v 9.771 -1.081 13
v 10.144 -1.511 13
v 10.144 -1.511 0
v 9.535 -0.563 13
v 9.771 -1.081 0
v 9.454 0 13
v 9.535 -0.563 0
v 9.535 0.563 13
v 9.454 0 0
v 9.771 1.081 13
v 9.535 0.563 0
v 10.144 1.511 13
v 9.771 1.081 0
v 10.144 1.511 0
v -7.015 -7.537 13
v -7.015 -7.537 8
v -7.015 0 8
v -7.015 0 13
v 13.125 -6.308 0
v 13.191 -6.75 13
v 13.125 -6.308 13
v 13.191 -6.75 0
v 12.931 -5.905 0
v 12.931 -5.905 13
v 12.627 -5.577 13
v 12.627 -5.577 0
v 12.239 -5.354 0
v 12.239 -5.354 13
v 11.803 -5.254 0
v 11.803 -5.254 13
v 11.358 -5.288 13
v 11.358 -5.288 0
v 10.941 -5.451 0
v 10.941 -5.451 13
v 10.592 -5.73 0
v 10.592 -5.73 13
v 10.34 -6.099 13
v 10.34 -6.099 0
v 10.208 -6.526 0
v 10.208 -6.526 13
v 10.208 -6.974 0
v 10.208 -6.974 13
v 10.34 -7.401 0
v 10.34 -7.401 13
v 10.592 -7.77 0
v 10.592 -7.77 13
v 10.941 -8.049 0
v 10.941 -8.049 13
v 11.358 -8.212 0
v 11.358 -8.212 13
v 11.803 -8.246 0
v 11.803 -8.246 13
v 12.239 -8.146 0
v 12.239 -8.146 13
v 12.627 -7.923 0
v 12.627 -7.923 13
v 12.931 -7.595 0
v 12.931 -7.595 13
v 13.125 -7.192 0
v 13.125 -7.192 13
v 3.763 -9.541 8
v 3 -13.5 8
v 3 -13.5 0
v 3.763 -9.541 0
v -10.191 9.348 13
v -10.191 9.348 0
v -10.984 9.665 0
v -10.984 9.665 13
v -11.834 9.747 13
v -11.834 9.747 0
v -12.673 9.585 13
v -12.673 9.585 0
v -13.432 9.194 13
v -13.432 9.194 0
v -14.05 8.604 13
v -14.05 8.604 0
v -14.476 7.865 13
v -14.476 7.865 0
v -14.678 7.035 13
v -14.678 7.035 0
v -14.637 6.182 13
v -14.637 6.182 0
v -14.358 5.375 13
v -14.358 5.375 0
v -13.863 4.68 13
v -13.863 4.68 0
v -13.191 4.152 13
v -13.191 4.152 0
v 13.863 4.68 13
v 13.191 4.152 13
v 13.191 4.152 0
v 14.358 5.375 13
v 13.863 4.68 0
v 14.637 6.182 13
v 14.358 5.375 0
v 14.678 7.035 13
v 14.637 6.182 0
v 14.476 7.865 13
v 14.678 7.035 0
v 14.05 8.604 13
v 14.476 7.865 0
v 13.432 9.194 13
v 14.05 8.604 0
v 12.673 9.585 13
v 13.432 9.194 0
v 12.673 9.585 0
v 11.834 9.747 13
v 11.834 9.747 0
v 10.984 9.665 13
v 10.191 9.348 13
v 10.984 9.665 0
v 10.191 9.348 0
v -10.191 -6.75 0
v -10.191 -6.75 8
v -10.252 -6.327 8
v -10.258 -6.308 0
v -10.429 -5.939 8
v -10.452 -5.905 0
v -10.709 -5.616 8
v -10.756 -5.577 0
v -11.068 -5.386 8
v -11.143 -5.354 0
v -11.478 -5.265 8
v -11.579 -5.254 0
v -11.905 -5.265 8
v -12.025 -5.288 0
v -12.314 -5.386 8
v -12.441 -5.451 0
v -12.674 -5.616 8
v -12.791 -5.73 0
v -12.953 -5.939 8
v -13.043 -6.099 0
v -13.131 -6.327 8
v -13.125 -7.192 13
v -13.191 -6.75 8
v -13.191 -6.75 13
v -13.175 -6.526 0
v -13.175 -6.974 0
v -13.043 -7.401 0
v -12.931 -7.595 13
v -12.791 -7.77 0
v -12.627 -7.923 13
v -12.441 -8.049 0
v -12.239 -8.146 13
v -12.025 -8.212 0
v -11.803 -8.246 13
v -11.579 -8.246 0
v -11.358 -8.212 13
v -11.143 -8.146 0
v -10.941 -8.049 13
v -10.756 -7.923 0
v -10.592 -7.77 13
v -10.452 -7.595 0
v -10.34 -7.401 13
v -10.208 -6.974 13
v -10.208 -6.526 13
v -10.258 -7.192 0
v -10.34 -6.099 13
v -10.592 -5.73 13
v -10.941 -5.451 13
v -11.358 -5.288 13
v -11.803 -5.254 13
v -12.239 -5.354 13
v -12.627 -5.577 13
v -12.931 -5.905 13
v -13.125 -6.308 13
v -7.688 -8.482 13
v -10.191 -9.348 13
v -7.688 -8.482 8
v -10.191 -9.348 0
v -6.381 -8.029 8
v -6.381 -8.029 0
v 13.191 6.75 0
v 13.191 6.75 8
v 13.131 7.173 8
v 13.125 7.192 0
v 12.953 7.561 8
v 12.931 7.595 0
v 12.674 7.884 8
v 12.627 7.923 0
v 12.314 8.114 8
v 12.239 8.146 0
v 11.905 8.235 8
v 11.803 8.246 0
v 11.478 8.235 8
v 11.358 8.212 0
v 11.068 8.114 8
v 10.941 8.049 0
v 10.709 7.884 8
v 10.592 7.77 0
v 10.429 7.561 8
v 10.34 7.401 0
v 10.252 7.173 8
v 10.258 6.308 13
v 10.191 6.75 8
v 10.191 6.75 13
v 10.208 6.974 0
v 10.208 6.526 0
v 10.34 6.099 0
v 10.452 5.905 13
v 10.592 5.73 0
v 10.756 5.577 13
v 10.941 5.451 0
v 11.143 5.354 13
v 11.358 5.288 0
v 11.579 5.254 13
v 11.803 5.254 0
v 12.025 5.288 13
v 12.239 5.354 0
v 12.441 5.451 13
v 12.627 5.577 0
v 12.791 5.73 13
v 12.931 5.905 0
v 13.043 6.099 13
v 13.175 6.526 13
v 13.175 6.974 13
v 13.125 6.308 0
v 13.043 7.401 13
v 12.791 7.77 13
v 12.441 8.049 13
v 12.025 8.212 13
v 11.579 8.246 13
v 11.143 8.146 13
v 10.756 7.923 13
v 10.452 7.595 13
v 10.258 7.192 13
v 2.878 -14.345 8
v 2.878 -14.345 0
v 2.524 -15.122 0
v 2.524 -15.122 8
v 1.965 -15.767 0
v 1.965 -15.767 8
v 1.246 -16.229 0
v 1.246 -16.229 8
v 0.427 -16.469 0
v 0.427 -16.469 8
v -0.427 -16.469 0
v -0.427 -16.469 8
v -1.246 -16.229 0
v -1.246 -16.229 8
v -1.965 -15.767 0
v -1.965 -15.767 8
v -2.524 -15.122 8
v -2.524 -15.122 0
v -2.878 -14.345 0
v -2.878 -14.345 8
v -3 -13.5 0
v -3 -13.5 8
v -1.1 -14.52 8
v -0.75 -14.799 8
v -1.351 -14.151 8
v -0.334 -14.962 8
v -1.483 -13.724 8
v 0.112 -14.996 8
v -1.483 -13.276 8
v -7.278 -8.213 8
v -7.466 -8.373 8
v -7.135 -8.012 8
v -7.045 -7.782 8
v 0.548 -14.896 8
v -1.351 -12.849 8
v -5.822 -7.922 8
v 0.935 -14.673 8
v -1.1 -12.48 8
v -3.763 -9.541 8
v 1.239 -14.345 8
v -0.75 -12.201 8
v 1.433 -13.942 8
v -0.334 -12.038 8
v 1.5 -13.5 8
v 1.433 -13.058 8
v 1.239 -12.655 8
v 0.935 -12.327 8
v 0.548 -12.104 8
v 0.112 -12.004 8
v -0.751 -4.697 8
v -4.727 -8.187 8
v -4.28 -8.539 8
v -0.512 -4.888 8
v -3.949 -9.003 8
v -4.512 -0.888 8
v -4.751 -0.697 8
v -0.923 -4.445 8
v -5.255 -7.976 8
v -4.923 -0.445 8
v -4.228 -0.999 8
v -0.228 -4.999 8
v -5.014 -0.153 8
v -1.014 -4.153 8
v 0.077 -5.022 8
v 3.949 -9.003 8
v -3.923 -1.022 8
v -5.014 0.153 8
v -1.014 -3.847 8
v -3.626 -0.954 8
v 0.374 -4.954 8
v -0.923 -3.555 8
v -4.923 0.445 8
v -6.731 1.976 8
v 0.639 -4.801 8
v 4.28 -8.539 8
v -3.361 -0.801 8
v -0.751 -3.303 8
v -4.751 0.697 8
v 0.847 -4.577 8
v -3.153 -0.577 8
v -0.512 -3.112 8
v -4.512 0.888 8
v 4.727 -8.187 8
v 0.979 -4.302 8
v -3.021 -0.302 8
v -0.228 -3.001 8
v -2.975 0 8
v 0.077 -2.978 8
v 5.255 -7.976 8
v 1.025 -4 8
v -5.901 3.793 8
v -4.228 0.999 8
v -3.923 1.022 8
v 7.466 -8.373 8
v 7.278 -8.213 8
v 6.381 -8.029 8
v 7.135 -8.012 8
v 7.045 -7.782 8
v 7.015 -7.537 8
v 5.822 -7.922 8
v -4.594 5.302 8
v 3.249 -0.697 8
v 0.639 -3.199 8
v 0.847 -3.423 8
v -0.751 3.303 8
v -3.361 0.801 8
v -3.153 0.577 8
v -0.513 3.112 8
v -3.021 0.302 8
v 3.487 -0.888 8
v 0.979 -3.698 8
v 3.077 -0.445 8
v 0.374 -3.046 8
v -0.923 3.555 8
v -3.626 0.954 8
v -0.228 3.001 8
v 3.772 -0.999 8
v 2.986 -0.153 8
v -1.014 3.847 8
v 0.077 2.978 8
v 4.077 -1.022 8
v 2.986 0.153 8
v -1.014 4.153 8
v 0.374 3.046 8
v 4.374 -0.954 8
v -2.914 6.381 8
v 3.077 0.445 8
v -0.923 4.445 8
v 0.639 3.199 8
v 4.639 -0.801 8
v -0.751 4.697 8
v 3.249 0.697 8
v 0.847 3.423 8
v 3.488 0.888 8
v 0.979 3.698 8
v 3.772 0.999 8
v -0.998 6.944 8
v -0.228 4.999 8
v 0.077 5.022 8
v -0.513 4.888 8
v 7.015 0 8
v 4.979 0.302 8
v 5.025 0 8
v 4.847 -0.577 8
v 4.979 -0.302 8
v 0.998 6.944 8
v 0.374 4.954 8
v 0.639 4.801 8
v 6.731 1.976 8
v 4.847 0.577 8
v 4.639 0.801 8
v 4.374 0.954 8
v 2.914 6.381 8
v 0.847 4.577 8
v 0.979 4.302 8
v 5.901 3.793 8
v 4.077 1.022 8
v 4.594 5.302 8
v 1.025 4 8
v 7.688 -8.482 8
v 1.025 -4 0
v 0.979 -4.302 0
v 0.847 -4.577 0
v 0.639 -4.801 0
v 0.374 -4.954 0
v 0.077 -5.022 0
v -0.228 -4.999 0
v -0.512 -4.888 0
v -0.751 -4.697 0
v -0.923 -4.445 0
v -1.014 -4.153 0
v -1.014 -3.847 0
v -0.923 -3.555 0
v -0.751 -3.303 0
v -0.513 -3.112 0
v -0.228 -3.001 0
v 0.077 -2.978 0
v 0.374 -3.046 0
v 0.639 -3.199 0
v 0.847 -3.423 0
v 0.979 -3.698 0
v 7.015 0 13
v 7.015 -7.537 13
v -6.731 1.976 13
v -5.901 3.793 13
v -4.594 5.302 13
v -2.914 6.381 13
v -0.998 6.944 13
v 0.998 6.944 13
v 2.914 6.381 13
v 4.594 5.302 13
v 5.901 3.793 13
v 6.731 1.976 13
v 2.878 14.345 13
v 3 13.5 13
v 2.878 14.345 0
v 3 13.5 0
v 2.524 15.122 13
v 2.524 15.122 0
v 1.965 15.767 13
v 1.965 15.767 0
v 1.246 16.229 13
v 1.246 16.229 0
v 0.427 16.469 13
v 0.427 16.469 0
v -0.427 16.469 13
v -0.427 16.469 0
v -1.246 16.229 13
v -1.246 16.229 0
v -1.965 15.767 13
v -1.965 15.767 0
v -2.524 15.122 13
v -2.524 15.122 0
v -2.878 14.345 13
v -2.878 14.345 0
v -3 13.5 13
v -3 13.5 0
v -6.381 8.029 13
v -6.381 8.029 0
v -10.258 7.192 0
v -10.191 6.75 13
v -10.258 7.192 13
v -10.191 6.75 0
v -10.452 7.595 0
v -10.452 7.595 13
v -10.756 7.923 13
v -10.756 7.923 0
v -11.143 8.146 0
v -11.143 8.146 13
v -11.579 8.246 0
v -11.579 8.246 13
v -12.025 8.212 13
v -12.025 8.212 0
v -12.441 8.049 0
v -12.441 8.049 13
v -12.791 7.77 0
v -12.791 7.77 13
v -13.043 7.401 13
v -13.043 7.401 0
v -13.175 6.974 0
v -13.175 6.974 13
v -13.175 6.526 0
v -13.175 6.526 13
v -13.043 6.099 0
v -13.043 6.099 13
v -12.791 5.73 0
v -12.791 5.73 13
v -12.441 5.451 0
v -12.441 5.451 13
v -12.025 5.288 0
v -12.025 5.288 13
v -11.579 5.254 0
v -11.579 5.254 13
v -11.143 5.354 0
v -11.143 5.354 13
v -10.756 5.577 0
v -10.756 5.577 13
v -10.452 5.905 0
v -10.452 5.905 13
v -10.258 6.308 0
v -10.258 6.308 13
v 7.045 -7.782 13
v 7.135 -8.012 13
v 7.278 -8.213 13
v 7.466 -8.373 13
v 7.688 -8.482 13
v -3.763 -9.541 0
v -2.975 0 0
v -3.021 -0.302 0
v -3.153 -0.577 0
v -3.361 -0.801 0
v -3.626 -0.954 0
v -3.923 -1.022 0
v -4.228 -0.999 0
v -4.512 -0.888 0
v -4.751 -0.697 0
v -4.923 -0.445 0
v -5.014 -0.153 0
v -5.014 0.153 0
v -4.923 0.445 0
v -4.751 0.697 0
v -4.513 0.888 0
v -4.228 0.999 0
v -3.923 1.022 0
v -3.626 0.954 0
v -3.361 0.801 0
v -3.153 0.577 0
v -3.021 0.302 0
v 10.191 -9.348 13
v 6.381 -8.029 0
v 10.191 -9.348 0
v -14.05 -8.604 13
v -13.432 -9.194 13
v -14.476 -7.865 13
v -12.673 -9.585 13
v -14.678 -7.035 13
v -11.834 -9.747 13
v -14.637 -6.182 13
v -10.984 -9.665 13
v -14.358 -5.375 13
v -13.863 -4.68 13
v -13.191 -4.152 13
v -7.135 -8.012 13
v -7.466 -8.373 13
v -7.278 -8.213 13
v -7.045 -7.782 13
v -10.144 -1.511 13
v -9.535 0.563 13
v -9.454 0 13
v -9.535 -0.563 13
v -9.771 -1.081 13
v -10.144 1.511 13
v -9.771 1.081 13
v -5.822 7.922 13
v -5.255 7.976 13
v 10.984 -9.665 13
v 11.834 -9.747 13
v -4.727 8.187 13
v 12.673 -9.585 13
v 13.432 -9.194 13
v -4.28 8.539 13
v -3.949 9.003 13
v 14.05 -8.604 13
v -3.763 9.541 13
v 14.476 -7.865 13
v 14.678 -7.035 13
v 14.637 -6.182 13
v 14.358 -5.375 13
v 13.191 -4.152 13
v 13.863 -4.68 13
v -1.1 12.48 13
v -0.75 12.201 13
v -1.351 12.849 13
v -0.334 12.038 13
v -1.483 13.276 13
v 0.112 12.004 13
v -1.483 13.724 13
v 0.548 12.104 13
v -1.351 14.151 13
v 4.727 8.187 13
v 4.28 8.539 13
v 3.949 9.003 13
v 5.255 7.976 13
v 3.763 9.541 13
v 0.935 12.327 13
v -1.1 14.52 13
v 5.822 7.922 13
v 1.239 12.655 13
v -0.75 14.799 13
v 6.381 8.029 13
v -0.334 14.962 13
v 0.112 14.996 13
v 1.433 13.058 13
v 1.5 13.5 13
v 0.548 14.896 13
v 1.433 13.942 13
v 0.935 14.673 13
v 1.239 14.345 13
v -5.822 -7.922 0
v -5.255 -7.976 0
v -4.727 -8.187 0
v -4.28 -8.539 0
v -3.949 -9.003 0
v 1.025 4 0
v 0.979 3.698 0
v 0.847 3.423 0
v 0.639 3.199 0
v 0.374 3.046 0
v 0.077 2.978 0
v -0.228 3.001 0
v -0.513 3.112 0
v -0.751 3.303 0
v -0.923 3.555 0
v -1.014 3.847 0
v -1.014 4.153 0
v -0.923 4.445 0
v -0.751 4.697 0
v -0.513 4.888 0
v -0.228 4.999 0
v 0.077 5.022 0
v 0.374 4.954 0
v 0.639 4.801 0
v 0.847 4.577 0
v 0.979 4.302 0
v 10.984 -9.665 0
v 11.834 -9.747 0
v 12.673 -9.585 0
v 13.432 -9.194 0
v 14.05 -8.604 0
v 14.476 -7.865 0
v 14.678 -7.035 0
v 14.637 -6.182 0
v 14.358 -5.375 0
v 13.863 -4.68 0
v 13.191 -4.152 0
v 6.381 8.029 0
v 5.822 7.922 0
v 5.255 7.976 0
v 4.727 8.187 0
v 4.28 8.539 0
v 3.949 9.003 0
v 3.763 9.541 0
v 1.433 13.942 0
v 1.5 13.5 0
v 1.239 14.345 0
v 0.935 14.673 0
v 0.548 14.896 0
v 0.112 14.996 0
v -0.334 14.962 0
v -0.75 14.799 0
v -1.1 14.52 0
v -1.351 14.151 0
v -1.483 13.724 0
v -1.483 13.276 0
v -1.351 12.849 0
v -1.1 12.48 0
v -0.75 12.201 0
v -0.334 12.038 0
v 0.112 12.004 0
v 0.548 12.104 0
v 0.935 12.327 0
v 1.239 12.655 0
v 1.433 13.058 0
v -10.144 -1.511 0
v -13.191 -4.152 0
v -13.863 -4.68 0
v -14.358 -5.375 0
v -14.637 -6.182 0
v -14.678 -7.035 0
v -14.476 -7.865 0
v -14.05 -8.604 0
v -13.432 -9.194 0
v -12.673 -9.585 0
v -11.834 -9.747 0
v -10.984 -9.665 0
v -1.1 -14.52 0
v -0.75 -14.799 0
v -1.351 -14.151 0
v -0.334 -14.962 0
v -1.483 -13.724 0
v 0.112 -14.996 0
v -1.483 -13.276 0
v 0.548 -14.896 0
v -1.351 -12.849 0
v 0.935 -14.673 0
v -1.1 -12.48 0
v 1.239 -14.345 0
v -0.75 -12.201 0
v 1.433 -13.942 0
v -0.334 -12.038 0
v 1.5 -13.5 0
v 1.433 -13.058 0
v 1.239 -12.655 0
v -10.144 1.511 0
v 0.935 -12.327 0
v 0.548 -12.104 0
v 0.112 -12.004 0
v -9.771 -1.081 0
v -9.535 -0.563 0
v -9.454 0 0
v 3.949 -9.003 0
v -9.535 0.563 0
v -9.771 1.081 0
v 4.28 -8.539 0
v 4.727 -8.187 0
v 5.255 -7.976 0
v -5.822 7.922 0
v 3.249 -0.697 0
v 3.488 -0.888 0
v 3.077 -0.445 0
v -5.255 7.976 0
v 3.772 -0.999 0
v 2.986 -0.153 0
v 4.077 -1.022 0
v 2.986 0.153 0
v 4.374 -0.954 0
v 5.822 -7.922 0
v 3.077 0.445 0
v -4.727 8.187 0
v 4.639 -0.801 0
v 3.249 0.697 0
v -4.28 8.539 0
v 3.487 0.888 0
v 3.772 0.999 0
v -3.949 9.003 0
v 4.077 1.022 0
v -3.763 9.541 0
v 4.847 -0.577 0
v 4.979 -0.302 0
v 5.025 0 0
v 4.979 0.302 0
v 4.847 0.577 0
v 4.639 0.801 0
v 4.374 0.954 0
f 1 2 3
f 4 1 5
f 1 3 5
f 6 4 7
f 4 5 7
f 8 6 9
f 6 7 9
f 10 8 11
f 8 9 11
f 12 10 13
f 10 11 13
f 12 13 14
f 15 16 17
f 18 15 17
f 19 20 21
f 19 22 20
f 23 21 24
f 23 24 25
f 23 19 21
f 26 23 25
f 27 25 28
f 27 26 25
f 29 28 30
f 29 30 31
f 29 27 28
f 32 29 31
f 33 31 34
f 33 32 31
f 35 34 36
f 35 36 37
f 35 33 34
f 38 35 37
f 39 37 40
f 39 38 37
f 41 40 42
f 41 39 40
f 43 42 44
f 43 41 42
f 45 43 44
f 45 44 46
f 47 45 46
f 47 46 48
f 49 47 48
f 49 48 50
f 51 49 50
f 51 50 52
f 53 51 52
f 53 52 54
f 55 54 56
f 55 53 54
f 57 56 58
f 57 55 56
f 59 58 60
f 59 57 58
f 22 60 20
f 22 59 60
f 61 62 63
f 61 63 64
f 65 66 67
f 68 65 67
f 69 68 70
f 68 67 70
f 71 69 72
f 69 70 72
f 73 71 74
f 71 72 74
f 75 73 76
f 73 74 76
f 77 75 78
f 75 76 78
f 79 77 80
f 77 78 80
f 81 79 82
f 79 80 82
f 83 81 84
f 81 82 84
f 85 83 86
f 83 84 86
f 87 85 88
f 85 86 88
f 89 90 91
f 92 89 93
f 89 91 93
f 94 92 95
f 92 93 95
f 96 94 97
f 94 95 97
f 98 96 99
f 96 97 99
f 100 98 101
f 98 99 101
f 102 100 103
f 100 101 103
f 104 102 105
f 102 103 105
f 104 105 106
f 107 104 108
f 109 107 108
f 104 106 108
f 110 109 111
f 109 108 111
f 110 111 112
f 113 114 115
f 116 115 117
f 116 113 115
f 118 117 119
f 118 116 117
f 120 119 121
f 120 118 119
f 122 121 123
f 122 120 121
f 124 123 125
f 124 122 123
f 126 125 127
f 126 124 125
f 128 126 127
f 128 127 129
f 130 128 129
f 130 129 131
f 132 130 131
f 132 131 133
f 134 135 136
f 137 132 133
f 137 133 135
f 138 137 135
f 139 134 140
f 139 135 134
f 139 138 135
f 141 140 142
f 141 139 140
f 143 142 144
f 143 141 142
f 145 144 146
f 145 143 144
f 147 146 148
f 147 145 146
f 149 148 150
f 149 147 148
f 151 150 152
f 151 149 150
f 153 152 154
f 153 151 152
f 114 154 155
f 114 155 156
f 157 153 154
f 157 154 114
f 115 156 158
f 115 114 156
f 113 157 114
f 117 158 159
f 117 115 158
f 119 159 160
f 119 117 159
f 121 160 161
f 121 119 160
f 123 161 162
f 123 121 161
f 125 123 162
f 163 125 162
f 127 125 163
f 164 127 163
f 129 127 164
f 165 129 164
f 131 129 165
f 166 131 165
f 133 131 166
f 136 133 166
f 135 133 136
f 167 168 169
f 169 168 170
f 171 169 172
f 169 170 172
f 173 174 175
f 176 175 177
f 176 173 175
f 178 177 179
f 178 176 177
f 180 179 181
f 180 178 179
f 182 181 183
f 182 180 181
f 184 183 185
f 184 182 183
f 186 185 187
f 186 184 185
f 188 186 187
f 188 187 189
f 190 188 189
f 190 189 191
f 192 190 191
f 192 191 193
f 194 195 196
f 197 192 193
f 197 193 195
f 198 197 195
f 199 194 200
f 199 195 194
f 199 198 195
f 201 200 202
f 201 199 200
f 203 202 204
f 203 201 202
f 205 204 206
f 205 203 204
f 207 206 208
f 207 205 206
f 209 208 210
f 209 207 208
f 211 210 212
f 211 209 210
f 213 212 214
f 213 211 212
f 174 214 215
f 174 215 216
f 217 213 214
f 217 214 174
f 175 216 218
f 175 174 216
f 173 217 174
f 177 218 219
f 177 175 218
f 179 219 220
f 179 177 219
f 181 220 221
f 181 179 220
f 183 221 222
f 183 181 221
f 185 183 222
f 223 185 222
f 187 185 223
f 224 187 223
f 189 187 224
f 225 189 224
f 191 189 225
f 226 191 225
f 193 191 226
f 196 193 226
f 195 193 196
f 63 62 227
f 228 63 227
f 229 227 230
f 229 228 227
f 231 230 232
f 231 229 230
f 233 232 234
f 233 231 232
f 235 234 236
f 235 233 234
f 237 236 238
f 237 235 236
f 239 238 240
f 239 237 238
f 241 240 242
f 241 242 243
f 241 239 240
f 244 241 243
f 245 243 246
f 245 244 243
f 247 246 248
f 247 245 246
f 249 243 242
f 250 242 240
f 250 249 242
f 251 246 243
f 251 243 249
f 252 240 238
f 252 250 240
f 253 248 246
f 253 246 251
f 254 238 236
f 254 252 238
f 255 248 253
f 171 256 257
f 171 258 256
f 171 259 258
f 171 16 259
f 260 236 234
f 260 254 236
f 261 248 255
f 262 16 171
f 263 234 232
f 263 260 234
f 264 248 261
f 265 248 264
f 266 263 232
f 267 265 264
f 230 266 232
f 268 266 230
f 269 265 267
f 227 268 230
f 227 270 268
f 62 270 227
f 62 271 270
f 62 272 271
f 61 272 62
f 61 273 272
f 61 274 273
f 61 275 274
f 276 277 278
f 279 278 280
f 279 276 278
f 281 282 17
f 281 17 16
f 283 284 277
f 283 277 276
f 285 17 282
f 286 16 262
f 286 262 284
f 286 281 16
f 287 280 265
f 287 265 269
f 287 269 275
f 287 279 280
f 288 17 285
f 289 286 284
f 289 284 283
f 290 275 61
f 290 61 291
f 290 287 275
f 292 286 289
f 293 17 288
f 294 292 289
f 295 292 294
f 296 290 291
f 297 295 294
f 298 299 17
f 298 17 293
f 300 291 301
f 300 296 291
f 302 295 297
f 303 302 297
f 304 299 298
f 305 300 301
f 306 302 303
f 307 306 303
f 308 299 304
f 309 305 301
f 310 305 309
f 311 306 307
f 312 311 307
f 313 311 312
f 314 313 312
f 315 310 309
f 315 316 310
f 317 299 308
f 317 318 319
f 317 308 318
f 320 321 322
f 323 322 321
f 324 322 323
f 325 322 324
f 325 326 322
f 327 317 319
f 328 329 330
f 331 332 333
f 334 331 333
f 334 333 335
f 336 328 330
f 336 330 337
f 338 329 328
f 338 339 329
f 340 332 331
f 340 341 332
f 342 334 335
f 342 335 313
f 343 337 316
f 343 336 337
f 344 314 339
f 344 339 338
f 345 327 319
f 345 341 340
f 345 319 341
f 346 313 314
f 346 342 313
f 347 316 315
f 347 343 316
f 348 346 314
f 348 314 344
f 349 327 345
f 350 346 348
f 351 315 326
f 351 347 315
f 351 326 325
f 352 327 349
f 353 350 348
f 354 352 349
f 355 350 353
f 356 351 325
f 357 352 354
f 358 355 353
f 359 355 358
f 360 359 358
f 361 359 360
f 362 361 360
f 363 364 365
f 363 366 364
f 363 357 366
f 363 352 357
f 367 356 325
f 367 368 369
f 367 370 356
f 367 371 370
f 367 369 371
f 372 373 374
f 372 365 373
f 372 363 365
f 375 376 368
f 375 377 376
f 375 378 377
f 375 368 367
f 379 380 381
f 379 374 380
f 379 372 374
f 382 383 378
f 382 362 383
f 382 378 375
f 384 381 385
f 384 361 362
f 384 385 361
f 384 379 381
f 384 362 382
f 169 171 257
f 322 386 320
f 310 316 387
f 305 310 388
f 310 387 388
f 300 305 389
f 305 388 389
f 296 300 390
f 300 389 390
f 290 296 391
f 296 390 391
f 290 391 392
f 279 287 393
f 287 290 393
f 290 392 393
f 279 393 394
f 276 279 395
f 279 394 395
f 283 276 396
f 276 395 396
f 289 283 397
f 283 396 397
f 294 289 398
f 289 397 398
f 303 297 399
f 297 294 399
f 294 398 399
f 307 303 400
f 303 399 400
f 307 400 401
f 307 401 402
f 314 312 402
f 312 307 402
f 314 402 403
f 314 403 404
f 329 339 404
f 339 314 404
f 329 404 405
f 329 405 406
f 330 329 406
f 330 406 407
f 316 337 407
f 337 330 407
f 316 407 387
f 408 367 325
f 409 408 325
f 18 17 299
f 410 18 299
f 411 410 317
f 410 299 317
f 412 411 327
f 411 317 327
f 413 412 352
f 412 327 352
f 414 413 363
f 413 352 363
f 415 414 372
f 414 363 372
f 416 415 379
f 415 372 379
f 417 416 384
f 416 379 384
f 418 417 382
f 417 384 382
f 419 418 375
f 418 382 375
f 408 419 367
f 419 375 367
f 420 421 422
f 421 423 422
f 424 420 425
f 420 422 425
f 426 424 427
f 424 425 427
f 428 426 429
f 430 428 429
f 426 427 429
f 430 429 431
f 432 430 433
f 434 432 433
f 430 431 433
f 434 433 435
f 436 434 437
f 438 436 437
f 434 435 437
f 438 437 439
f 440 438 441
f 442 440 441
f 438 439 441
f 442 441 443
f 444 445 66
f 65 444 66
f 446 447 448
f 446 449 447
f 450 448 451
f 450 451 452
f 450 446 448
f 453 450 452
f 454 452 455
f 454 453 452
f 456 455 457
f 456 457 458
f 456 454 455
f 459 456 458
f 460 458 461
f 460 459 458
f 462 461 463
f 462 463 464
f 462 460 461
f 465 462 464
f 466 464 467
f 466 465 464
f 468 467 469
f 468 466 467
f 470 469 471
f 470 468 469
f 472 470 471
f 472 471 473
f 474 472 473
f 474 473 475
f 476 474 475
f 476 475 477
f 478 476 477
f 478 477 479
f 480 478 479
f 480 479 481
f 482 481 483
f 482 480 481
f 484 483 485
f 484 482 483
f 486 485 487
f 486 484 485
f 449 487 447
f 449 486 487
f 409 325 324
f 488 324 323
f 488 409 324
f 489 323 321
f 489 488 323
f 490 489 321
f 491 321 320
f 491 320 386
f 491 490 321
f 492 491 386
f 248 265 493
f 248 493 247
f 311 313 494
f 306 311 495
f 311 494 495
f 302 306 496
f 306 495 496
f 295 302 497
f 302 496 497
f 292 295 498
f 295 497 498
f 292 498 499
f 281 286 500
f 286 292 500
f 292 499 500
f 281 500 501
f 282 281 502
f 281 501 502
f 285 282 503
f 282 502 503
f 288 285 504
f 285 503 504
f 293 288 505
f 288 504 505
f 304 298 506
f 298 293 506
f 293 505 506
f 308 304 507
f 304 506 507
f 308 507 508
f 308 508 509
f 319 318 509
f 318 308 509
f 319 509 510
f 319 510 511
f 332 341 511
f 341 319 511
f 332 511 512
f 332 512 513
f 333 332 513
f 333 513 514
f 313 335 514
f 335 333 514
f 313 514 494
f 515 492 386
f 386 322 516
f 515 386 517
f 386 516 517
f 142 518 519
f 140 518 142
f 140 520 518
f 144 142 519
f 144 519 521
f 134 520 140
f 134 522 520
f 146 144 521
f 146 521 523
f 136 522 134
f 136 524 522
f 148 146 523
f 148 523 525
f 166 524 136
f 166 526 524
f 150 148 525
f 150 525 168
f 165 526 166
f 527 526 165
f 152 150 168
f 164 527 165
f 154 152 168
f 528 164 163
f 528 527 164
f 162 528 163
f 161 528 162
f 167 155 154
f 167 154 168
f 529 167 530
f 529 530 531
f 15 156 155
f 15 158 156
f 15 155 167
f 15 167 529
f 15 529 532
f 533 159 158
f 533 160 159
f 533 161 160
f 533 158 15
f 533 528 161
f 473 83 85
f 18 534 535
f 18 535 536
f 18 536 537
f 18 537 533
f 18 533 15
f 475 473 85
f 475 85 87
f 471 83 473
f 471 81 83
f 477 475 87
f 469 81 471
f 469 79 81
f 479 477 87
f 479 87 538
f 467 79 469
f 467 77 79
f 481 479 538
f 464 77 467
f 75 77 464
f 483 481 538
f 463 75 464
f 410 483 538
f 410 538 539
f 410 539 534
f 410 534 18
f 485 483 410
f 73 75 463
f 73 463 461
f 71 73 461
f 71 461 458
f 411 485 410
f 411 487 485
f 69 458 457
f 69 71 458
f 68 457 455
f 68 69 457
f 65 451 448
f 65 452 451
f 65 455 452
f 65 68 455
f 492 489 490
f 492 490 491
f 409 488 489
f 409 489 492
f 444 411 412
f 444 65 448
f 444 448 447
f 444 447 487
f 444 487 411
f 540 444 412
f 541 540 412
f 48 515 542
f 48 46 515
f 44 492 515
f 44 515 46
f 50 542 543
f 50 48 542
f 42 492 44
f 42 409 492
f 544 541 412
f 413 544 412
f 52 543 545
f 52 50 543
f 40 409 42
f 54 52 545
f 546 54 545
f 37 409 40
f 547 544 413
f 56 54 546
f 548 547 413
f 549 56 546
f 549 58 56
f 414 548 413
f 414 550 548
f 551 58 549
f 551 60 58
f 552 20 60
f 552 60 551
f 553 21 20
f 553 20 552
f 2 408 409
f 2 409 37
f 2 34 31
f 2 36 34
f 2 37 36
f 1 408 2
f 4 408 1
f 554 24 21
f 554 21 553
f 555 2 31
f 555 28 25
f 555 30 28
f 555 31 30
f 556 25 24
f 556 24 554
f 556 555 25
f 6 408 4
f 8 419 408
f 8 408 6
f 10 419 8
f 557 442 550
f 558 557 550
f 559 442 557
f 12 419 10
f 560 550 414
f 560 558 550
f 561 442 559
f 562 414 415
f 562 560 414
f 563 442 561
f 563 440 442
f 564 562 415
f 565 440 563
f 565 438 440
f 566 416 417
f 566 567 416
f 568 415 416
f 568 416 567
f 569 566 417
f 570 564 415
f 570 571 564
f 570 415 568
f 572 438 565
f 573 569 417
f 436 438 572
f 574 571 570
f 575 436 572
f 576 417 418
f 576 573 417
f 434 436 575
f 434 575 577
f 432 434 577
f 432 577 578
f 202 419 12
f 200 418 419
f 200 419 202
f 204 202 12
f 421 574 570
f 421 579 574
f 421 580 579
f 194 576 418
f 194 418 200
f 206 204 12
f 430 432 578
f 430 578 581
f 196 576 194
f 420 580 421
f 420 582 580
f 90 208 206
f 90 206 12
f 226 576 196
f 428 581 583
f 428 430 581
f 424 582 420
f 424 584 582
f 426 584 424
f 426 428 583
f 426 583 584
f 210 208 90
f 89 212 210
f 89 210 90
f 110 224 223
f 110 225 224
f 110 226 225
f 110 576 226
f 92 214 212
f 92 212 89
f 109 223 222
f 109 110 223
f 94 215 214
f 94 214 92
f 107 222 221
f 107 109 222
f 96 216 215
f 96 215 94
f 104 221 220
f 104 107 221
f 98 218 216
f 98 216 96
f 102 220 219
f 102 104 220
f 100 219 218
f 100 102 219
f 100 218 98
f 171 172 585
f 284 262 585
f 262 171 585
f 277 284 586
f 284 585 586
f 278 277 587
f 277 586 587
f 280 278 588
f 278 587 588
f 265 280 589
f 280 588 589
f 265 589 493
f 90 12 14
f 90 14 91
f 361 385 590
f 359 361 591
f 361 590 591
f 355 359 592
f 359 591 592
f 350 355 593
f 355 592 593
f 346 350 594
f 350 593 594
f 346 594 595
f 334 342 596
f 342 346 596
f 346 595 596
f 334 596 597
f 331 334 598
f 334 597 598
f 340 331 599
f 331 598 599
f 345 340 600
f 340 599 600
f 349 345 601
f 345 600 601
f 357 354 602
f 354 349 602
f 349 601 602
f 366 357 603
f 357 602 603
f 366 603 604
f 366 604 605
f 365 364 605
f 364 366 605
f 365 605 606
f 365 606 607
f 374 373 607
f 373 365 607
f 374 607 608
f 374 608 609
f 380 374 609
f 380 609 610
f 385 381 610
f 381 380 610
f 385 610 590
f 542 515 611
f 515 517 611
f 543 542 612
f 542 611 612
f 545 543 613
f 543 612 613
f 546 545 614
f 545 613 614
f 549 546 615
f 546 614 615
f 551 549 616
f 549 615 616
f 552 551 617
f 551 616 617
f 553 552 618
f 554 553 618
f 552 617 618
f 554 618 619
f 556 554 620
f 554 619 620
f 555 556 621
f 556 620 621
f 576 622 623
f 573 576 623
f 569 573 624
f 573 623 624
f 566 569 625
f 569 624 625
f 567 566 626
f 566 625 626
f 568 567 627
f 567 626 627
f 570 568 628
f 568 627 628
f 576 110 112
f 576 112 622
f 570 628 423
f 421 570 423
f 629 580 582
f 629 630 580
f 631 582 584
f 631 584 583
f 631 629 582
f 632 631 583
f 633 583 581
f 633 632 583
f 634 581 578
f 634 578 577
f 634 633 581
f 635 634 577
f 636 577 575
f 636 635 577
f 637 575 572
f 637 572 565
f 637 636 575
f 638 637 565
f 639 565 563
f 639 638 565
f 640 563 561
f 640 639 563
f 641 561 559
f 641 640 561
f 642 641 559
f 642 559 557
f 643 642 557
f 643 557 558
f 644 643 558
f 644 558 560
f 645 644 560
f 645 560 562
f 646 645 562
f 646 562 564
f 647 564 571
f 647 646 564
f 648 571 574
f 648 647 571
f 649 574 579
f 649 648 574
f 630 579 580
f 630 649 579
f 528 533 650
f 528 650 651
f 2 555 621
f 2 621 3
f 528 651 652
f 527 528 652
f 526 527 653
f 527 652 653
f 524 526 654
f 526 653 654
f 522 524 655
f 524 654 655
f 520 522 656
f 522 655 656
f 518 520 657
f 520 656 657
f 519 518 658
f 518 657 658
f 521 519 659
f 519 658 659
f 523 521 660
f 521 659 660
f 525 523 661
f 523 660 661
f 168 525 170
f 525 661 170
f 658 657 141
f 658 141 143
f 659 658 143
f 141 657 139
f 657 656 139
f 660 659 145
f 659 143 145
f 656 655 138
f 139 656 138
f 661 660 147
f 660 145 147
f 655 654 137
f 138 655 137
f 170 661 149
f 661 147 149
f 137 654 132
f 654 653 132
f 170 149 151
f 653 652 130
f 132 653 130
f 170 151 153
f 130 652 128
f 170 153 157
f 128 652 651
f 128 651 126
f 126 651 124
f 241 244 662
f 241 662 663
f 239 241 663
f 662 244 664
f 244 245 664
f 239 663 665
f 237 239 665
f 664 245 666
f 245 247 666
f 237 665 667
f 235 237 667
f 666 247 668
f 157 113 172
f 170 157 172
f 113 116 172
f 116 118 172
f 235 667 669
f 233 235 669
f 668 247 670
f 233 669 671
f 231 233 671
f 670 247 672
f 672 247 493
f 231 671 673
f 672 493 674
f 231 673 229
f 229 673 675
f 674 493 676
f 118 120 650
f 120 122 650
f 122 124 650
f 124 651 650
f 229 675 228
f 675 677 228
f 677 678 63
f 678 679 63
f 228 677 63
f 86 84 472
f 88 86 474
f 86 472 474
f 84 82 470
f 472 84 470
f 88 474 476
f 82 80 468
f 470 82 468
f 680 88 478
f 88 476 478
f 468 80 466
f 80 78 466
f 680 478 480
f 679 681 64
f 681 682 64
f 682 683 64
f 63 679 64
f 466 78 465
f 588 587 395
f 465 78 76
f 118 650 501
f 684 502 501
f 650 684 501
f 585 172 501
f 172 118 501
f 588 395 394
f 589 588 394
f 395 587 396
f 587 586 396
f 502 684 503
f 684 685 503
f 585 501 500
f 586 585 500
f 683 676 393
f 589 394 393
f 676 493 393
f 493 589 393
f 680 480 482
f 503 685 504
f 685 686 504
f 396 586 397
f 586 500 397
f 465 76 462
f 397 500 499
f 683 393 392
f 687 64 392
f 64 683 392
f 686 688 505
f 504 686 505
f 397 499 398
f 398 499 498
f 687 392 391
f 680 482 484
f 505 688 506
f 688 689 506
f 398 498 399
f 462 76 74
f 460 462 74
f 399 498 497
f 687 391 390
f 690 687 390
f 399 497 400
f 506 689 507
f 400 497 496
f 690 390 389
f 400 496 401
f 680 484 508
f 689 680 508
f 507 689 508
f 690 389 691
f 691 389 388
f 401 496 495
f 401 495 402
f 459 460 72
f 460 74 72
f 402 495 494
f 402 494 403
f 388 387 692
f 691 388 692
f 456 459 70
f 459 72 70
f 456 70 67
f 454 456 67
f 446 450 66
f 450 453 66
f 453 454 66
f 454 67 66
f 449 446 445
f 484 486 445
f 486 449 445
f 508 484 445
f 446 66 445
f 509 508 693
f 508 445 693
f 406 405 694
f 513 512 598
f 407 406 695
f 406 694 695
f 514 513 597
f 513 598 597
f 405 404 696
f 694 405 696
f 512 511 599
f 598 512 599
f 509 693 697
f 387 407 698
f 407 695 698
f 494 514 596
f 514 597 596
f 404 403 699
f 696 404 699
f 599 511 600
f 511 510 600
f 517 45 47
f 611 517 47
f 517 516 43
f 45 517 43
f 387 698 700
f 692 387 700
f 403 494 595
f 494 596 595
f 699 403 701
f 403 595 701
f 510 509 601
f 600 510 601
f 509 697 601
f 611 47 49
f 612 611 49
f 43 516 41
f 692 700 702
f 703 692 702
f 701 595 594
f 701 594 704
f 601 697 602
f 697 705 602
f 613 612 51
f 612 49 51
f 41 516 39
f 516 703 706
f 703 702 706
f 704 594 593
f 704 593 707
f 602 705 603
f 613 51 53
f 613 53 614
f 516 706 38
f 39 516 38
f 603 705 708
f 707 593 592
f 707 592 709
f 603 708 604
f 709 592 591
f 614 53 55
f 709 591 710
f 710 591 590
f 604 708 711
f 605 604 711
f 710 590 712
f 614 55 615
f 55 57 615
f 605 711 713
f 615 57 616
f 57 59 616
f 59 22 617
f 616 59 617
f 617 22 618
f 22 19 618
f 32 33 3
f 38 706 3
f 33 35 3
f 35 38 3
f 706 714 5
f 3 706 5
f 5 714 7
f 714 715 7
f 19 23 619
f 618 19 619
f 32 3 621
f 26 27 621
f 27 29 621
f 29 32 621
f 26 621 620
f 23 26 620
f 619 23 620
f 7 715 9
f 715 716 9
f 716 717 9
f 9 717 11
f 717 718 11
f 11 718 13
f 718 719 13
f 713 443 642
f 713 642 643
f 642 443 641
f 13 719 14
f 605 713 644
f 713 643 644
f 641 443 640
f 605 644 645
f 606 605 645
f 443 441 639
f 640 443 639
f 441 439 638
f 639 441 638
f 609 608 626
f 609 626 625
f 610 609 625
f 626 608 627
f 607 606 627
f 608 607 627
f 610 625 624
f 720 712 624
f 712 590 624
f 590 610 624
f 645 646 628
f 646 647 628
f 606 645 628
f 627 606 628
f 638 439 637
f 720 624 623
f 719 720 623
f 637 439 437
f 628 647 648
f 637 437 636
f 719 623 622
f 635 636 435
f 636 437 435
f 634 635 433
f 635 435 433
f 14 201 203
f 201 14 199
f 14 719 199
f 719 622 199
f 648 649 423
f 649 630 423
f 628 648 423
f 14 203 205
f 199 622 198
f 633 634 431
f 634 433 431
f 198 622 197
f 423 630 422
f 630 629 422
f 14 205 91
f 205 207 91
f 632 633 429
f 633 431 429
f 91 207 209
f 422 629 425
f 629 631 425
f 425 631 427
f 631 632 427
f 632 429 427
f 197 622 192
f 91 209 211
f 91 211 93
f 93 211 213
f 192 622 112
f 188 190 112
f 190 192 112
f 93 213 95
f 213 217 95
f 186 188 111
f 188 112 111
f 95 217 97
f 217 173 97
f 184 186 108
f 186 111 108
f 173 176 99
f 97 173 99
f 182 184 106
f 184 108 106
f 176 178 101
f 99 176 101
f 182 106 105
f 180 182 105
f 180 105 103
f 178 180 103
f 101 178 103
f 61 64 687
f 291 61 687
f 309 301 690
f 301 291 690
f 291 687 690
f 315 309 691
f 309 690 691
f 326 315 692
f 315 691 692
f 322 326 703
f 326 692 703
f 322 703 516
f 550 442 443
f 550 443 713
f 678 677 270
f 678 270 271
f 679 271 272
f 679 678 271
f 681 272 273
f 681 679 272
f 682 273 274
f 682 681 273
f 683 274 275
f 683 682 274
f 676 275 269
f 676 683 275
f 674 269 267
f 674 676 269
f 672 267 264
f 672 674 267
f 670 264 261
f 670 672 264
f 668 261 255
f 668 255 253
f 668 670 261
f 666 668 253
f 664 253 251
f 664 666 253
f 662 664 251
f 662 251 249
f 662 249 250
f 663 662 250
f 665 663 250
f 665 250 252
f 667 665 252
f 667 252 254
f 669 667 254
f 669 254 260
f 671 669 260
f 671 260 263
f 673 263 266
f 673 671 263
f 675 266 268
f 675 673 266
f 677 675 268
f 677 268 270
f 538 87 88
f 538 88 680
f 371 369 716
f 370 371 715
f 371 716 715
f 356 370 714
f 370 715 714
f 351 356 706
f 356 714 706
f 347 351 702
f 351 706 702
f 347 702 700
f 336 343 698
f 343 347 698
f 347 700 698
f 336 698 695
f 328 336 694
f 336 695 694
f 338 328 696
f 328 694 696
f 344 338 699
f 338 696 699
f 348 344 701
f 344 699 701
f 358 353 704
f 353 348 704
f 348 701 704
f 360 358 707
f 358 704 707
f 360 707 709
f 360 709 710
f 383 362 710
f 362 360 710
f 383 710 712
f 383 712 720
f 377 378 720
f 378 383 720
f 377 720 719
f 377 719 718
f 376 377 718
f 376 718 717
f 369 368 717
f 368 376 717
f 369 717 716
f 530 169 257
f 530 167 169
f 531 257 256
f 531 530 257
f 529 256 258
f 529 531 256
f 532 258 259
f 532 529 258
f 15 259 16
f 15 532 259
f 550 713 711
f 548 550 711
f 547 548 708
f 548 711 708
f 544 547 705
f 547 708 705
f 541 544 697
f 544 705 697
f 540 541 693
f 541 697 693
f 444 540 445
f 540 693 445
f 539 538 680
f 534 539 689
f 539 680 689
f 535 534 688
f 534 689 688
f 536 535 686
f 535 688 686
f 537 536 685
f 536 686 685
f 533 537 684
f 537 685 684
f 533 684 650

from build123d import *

# Parameters (mm, degrees)
SKETCH_2_R          = 18
SKETCH_2_R_2        = 1.4999999999999998
SKETCH_2_R_3        = 1.5000000000000022
SKETCH_2_R_4        = 1.5000000000000007
SKETCH_2_R_5        = 10.499999999999998
SKETCH_2_R_6        = 1.4999999999999987
EXTRUDE_1_DEPTH     = 8
EXTRUDE_START       = -4
SKETCH_6_R          = 10.499999999999998
EXTRUDE_2_DEPTH     = 4
SKETCH_7_R          = 2.9999999999999996
SKETCH_7_R_2        = 1.5000000000000004
SKETCH_7_R_3        = 1.5000000000000013
EXTRUDE_3_DEPTH     = 4
SKETCH_9_R          = 1.025
SKETCH_9_R_2        = 1.0250000000000001
CUT_EXTRUDE_2_DEPTH = 4
CUT_EXTRUDE_3_DEPTH = 13.000000000000002
CUT_EXTRUDE_4_DEPTH = 23
CUT_EXTRUDE_START   = -8
SKETCH_13_R         = 18
CUT_EXTRUDE_5_DEPTH = 8
FILLET_6_R          = 2
FILLET_7_R          = 2
SKETCH_22_R         = 26.500000000000004
CUT_EXTRUDE_7_DEPTH = 4
SKETCH_23_R         = 1.5000000000000024
SKETCH_23_R_2       = 1.4999999999999998
EXTRUDE_4_DEPTH     = 5
FILLET_8_R          = 1
EXTRUDE_START_2     = 4
SKETCH_24_R         = 1.0250000000000001
SKETCH_24_R_2       = 1.025
EXTRUDE_5_DEPTH     = 4


with BuildPart() as part:
    # 草图2 → 凸台-拉伸1 (new body)
    with BuildSketch(Plane.XY):
        Circle(SKETCH_2_R)
        with Locations((0, 13.5)):
            Circle(SKETCH_2_R_2, mode=Mode.SUBTRACT)
        with Locations((11.691342951089924, -6.749999999999998)):
            Circle(SKETCH_2_R_3, mode=Mode.SUBTRACT)
        with Locations((-11.691342951089919, -6.750000000000006)):
            Circle(SKETCH_2_R_4, mode=Mode.SUBTRACT)
        Circle(SKETCH_2_R_5, mode=Mode.SUBTRACT)
        with Locations((0, -13.5)):
            Circle(SKETCH_2_R_2, mode=Mode.SUBTRACT)
        with Locations((-11.691342951089924, 6.749999999999997)):
            Circle(SKETCH_2_R_6, mode=Mode.SUBTRACT)
        with Locations((11.691342951089919, 6.750000000000008)):
            Circle(SKETCH_2_R_4, mode=Mode.SUBTRACT)
    extrude(amount=EXTRUDE_1_DEPTH)

    # 草图6 → 凸台-拉伸2 (add)
    with BuildSketch(Plane.XY.offset(8).offset(EXTRUDE_START)):
        Circle(SKETCH_6_R)
    extrude(amount=EXTRUDE_2_DEPTH)

    # 草图9 → 切除-拉伸2 (cut)
    with BuildSketch(Plane.XY.offset(8)):
        with Locations((0, 4)):
            Circle(SKETCH_9_R)
        with Locations((-4, 2.4e-16)):
            Circle(SKETCH_9_R_2)
        with Locations((4.9e-16, -4)):
            Circle(SKETCH_9_R)
        with Locations((4, 2.4e-16)):
            Circle(SKETCH_9_R_2)
    extrude(amount=-CUT_EXTRUDE_2_DEPTH, mode=Mode.SUBTRACT)

    # 草图13 → 切除-拉伸5 (cut)
    with BuildSketch(Plane.XY.offset(8).offset(CUT_EXTRUDE_START)):
        Circle(SKETCH_13_R)
        with BuildLine():
            Line((-4.2, 7.274613391789286), (-3.0000000000000004, 13.5))
            ThreePointArc((-3.0000000000000004, 13.5), (1.8e-16, 16.5), (3.0000000000000004, 13.5))
            Line((3.0000000000000004, 13.5), (4.2, 7.274613391789286))
            Line((4.2, 7.274613391789286), (10.191342951089922, 9.348076211353316))
            ThreePointArc((10.19134295108992, 9.34807621135332), (13.19134295108992, 9.34807621135332), (14.691342951089922, 6.750000000000004))
            ThreePointArc((14.691342951089922, 6.7500000000000036), (14.289419162443235, 5.250000000000002), (13.191342951089917, 4.151923788646687))
            Line((13.19134295108992, 4.151923788646681), (8.4, 8.9e-16))
            Line((8.4, 8.9e-16), (13.19134295108992, -4.151923788646685))
            ThreePointArc((13.191342951089924, -4.151923788646679), (14.289419162443242, -5.249999999999996), (14.691342951089926, -6.749999999999997))
            ThreePointArc((14.691342951089926, -6.749999999999998), (13.191342951089924, -9.348076211353316), (10.191342951089919, -9.348076211353312))
            Line((10.191342951089919, -9.348076211353318), (4.200000000000001, -7.274613391789285))
            Line((4.200000000000001, -7.274613391789285), (2.999999999999996, -13.5))
            ThreePointArc((3.000000000000002, -13.5), (1.18e-15, -16.5), (-2.9999999999999987, -13.5))
            Line((-3.000000000000005, -13.499999999999996), (-4.199999999999998, -7.274613391789289))
            Line((-4.199999999999998, -7.274613391789289), (-10.191342951089924, -9.34807621135331))
            ThreePointArc((-10.191342951089917, -9.348076211353325), (-14.289419162443238, -8.250000000000007), (-13.191342951089919, -4.1519237886466875))
            Line((-13.191342951089924, -4.151923788646676), (-8.4, -6.22e-15))
            Line((-8.4, -6.22e-15), (-13.191342951089919, 4.151923788646697))
            ThreePointArc((-13.191342951089933, 4.151923788646676), (-14.289419162443243, 8.249999999999995), (-10.191342951089926, 9.348076211353307))
            Line((-10.191342951089913, 9.348076211353327), (-4.2, 7.274613391789286))
        make_face(mode=Mode.SUBTRACT)
    extrude(amount=CUT_EXTRUDE_5_DEPTH, mode=Mode.SUBTRACT)

    # 圆角6
    fillet_6_edges = [part.edges().sort_by_distance(p)[0] for p in [
        (-3.7087365602143945, 9.823200757743328, 2),
        (-4.2, 7.274613391789286, 6),
        (-10.361509682787466, -1.6997403017818833, 2),
        (-3.708736560214394, -9.823200757743328, 2),
        (6.652773122573071, -8.123460455961444, 2),
        (10.361509682787464, 1.6997403017818842, 2),
        (3.7087365602143936, 9.823200757743328, 2),
        (-6.652773122573068, 8.123460455961448, 2),
        (-10.361509682787464, 1.6997403017818868, 2),
        (-8.4, -6.22e-15, 6),
        (-6.652773122573072, -8.123460455961444, 2),
        (-4.199999999999998, -7.274613391789289, 6),
        (3.7087365602143914, -9.823200757743328, 2),
        (4.200000000000001, -7.274613391789285, 6),
        (10.361509682787466, -1.6997403017818833, 2),
        (8.4, 8.9e-16, 6),
        (6.652773122573071, 8.123460455961444, 2),
        (4.2, 7.274613391789286, 6),
    ]]
    fillet(fillet_6_edges, radius=FILLET_6_R)

    # 草图23 → 凸台-拉伸4 (add)
    with BuildSketch(Plane.XY.offset(8)):
        with BuildLine():
            Line((7.015, 0), (7.015, -8.248818655070188))
            Line((7.015, -8.248818655070188), (10.191342951089933, -9.348076211353321))
            ThreePointArc((10.191342951089933, -9.348076211353321), (14.289419162443245, -8.249999999999993), (13.19134295108992, -4.151923788646683))
            Line((13.19134295108992, -4.151923788646683), (10.144242051851217, -1.5114676912433453))
            ThreePointArc((10.144242051851217, -1.5114676912433453), (9.45399982271097, 1.11e-15), (10.144242051851217, 1.5114676912433471))
            Line((10.144242051851217, 1.5114676912433471), (13.19134295108992, 4.151923788646685))
            ThreePointArc((13.19134295108992, 4.151923788646685), (14.289419162443243, 8.249999999999995), (10.191342951089933, 9.348076211353321))
            Line((10.191342951089933, 9.348076211353321), (7.015, 8.248818655070192))
            Line((7.015, 8.248818655070192), (6.381090443541757, 8.029437473419858))
            ThreePointArc((6.381090443541757, 8.029437473419858), (4.726999911355481, 8.187404013841277), (3.7631516083094527, 9.540905164663204))
            Line((3.7631516083094527, 9.540905164663204), (2.9999999999999996, 13.5))
            ThreePointArc((2.9999999999999996, 13.5), (1.8e-16, 16.5), (-2.9999999999999996, 13.5))
            Line((-2.9999999999999996, 13.5), (-3.7631516083094527, 9.540905164663204))
            ThreePointArc((-3.7631516083094527, 9.540905164663204), (-4.726999911355481, 8.187404013841277), (-6.381090443541757, 8.029437473419858))
            Line((-6.381090443541757, 8.029437473419858), (-7.015, 8.248818655070192))
            Line((-7.015, 8.248818655070192), (-10.191342951089933, 9.348076211353321))
            ThreePointArc((-10.191342951089933, 9.348076211353321), (-14.289419162443243, 8.249999999999995), (-13.19134295108992, 4.151923788646685))
            Line((-13.19134295108992, 4.151923788646685), (-10.144242051851217, 1.5114676912433471))
            ThreePointArc((-10.144242051851217, 1.5114676912433471), (-9.45399982271097, 8.7e-16), (-10.144242051851217, -1.5114676912433453))
            Line((-10.144242051851217, -1.5114676912433453), (-13.19134295108992, -4.151923788646683))
            ThreePointArc((-13.19134295108992, -4.151923788646683), (-14.289419162443245, -8.249999999999993), (-10.191342951089933, -9.348076211353321))
            Line((-10.191342951089933, -9.348076211353321), (-7.015, -8.248818655070188))
            Line((-7.015, -8.248818655070188), (-7.015, 0))
            ThreePointArc((-7.015, 0), (4.3e-16, 7.015), (7.015, 0))
        make_face()
        with Locations((11.691342951089924, -6.749999999999998)):
            Circle(SKETCH_23_R, mode=Mode.SUBTRACT)
        with Locations(Location((11.691342951089924, 6.75, 0), (0, 0, 180))):
            Circle(SKETCH_23_R, mode=Mode.SUBTRACT)
        with Locations((0, 13.5)):
            Circle(SKETCH_23_R_2, mode=Mode.SUBTRACT)
        with Locations(Location((-11.691342951089924, -6.749999999999998, 0), (0, 0, 180))):
            Circle(SKETCH_23_R, mode=Mode.SUBTRACT)
        with Locations((-11.691342951089924, 6.75)):
            Circle(SKETCH_23_R, mode=Mode.SUBTRACT)
    extrude(amount=EXTRUDE_4_DEPTH)

    # 圆角8
    fillet_8_edges = [part.edges().sort_by_distance(p)[0] for p in [
        (7.015, -8.248818655070188, 10.5),
        (-7.015, -8.248818655070188, 10.5),
    ]]
    fillet(fillet_8_edges, radius=FILLET_8_R)

    # 草图24 → 凸台-拉伸5 (add)
    with BuildSketch(Plane(origin=(0, 0, 4), x_dir=(-1, 0, 0), z_dir=(0, 0, -1)).offset(EXTRUDE_START_2)):
        with BuildLine():
            Line((-3.7631516083094545, 9.540905164663204), (-3.130304023425084, 12.824005897977921))
            ThreePointArc((-3.130304023425084, 12.824005897977921), (-2.647549400093676, 11.101446750226756), (-0.9798228051184064, 10.454183242634018))
            ThreePointArc((-0.9798228051184064, 10.454183242634018), (6.4e-16, 10.499999999999998), (0.9798228051184061, 10.454183242634016))
            ThreePointArc((0.9798228051184061, 10.454183242634016), (2.647549400093674, 11.101446750226758), (3.130304023425079, 12.824005897977921))
            Line((3.130304023425079, 12.824005897977921), (3.763151608309469, 9.540905164663112))
            ThreePointArc((3.763151608309469, 9.540905164663112), (4.726999911355525, 8.187404013841222), (6.38109044354178, 8.029437473419842))
            Line((6.38109044354178, 8.029437473419842), (9.540762874217831, 9.122925754843699))
            ThreePointArc((9.540762874217831, 9.122925754843699), (8.290360204409751, 7.8435684133687325), (8.56367686137945, 6.075643061756859))
            ThreePointArc((8.56367686137945, 6.075643061756859), (9.093266739736617, 5.249999999999978), (9.54349966649785, 4.378540180877117))
            ThreePointArc((9.54349966649785, 4.378540180877117), (10.937909604503425, 3.2578783368579787), (12.671066897642891, 3.701080143134205))
            Line((12.671066897642891, 3.701080143134205), (10.14424205185114, 1.5114676912432894))
            ThreePointArc((10.14424205185114, 1.5114676912432894), (9.45399982271092, -7.925e-14), (10.144242051851208, -1.5114676912433949))
            Line((10.144242051851208, -1.5114676912433949), (12.671066897642879, -3.7010801431342593))
            ThreePointArc((12.671066897642879, -3.7010801431342593), (10.937909604503396, -3.257878336858057), (9.543499666497823, -4.378540180877186))
            ThreePointArc((9.543499666497823, -4.378540180877186), (9.093266739736583, -5.250000000000044), (8.563676861379406, -6.075643061756919))
            ThreePointArc((8.563676861379406, -6.075643061756919), (8.290360204409705, -7.843568413368805), (9.540762874217815, -9.122925754843717))
            Line((9.540762874217815, -9.122925754843717), (6.381090443541676, -8.029437473419822))
            ThreePointArc((6.381090443541676, -8.029437473419822), (4.726999911355367, -8.187404013841265), (3.763151608309388, -9.540905164663233))
            Line((3.763151608309388, -9.540905164663233), (3.1303040234249946, -12.824005897977946))
            ThreePointArc((3.1303040234249946, -12.824005897977946), (2.647549400093598, -11.101446750226778), (0.9798228051183333, -10.454183242634029))
            ThreePointArc((0.9798228051183333, -10.454183242634029), (-7.396e-14, -10.500000000000002), (-0.9798228051184793, -10.454183242634013))
            ThreePointArc((-0.9798228051184793, -10.454183242634013), (-2.647549400093763, -11.101446750226756), (-3.130304023425077, -12.824005897977921))
            Line((-3.130304023425077, -12.824005897977921), (-3.763151608309468, -9.540905164663112))
            ThreePointArc((-3.763151608309468, -9.540905164663112), (-4.726999911355536, -8.187404013841146), (-6.381090443541838, -8.029437473419797))
            Line((-6.381090443541838, -8.029437473419797), (-9.540762874217897, -9.122925754843633))
            ThreePointArc((-9.540762874217897, -9.122925754843633), (-8.29036020440981, -7.843568413368676), (-8.563676861379493, -6.075643061756799))
            ThreePointArc((-8.563676861379493, -6.075643061756799), (-9.093266739736658, -5.249999999999916), (-9.543499666497883, -4.378540180877051))
            ThreePointArc((-9.543499666497883, -4.378540180877051), (-10.937909604503469, -3.2578783368579), (-12.67106689764289, -3.70108014313421))
            Line((-12.67106689764289, -3.70108014313421), (-10.14424205185114, -1.5114676912432934))
            ThreePointArc((-10.14424205185114, -1.5114676912432934), (-9.453999822710855, 1.3597e-13), (-10.14424205185128, 1.5114676912434042))
            Line((-10.14424205185128, 1.5114676912434042), (-12.671066897642895, 3.7010801431342033))
            ThreePointArc((-12.671066897642895, 3.7010801431342033), (-10.937909604503313, 3.2578783368580044), (-9.54349966649779, 4.378540180877251))
            ThreePointArc((-9.54349966649779, 4.378540180877251), (-9.093266739736544, 5.250000000000108), (-8.563676861379363, 6.075643061756977))
            ThreePointArc((-8.563676861379363, 6.075643061756977), (-8.290360204409655, 7.84356841336888), (-9.540762874217819, 9.12292575484371))
            Line((-9.540762874217819, 9.12292575484371), (-6.381090443541672, 8.029437473419822))
            ThreePointArc((-6.381090443541672, 8.029437473419822), (-4.72699991135544, 8.187404013841295), (-3.7631516083094545, 9.540905164663204))
        make_face()
        with Locations(Location((-4, 2.4e-16, 0), (0, 0, 180))):
            Circle(SKETCH_24_R, mode=Mode.SUBTRACT)
        with Locations(Location((0, 4, 0), (0, 0, 180))):
            Circle(SKETCH_24_R_2, mode=Mode.SUBTRACT)
        with Locations(Location((4, 2.4e-16, 0), (0, 0, 180))):
            Circle(SKETCH_24_R, mode=Mode.SUBTRACT)
        with Locations(Location((-4.9e-16, -4, 0), (0, 0, 180))):
            Circle(SKETCH_24_R_2, mode=Mode.SUBTRACT)
    extrude(amount=-EXTRUDE_5_DEPTH)


with BuildPart() as body_2:
    # 草图7 → 凸台-拉伸3 (new body)
    with BuildSketch(Plane.XY.offset(8)):
        with BuildLine():
            Line((-7.5, 0), (-7.5, 20))
            ThreePointArc((-7.5, 20), (4.6e-16, 27.5), (7.5, 20))
            Line((7.5, 20), (7.5, 0))
            ThreePointArc((7.5, 0), (-1.38e-15, -7.5), (-7.5, 0))
        make_face()
        with Locations((0, 20)):
            Circle(SKETCH_7_R, mode=Mode.SUBTRACT)
        with Locations((0, 4)):
            Circle(SKETCH_7_R_2, mode=Mode.SUBTRACT)
        with Locations((4, 2.4e-16)):
            Circle(SKETCH_7_R_3, mode=Mode.SUBTRACT)
        with Locations((4.9e-16, -4)):
            Circle(SKETCH_7_R_2, mode=Mode.SUBTRACT)
        with Locations((-4, 2.4e-16)):
            Circle(SKETCH_7_R_3, mode=Mode.SUBTRACT)
    extrude(amount=EXTRUDE_3_DEPTH)

    # 草图11 → 切除-拉伸3 (cut)
    with BuildSketch(Plane.XY.offset(12)):
        with BuildLine():
            Line((-7.5, 18.26794919243113), (-6.5, 20))
            ThreePointArc((-6.500000000000001, 20), (4e-16, 26.5), (6.500000000000001, 20))
            Line((6.500000000000002, 20), (7.5000000000000036, 18.267949192431132))
            Line((7.5, 18.267949192431132), (7.5, 20))
            ThreePointArc((7.5, 20), (2.12e-15, 27.5), (-7.5, 20.000000000000004))
            Line((-7.5, 20), (-7.5, 18.26794919243113))
        make_face()
    extrude(amount=-CUT_EXTRUDE_3_DEPTH, mode=Mode.SUBTRACT)

    # 草图12 → 切除-拉伸4 (cut)
    with BuildSketch(Plane.XY.offset(12)):
        with BuildLine():
            Line((2.800000000000002, 12), (2.800000000000002, 10))
            ThreePointArc((2.800000000000002, 10), (1.93e-15, 7.199999999999999), (-2.7999999999999976, 10))
            Line((-2.7999999999999976, 10), (-2.7999999999999976, 12))
            ThreePointArc((-2.7999999999999976, 12), (2.38e-15, 14.8), (2.800000000000002, 12))
        make_face()
    extrude(amount=-CUT_EXTRUDE_4_DEPTH, mode=Mode.SUBTRACT)

    # 草图20 → M4 六角凹锥坑螺钉的锥形沉头孔2 (revolve, cut)
    with BuildSketch(Plane(origin=(0, 20, 8), x_dir=(0, 1, 0), z_dir=(1, 0, 0))):
        Polygon((0, 0), (-2.78e-15, 11.35193639281201), (2.2499999999999982, 10), (2.249999999999999, 2.2300000000000004), (4.480000000000001, -1.73e-15), align=None)
    revolve(axis=Axis((0, 20, 1.6500000000000092), (0, 0, 1)), mode=Mode.SUBTRACT)

    # 圆角7
    fillet_7_edges = [body_2.edges().sort_by_distance(p)[0] for p in [
        (-7.5, 18.26794919243113, 10),
        (6.500000000000002, 20, 10),
        (7.500000000000002, 18.267949192431132, 10),
        (-6.5, 20, 10),
    ]]
    fillet(fillet_7_edges, radius=FILLET_7_R)

    # 草图22 → 切除-拉伸7 (cut)
    with BuildSketch(Plane.XY.offset(12)):
        Circle(SKETCH_22_R)
    extrude(amount=-CUT_EXTRUDE_7_DEPTH, mode=Mode.SUBTRACT)


solid = part.part
